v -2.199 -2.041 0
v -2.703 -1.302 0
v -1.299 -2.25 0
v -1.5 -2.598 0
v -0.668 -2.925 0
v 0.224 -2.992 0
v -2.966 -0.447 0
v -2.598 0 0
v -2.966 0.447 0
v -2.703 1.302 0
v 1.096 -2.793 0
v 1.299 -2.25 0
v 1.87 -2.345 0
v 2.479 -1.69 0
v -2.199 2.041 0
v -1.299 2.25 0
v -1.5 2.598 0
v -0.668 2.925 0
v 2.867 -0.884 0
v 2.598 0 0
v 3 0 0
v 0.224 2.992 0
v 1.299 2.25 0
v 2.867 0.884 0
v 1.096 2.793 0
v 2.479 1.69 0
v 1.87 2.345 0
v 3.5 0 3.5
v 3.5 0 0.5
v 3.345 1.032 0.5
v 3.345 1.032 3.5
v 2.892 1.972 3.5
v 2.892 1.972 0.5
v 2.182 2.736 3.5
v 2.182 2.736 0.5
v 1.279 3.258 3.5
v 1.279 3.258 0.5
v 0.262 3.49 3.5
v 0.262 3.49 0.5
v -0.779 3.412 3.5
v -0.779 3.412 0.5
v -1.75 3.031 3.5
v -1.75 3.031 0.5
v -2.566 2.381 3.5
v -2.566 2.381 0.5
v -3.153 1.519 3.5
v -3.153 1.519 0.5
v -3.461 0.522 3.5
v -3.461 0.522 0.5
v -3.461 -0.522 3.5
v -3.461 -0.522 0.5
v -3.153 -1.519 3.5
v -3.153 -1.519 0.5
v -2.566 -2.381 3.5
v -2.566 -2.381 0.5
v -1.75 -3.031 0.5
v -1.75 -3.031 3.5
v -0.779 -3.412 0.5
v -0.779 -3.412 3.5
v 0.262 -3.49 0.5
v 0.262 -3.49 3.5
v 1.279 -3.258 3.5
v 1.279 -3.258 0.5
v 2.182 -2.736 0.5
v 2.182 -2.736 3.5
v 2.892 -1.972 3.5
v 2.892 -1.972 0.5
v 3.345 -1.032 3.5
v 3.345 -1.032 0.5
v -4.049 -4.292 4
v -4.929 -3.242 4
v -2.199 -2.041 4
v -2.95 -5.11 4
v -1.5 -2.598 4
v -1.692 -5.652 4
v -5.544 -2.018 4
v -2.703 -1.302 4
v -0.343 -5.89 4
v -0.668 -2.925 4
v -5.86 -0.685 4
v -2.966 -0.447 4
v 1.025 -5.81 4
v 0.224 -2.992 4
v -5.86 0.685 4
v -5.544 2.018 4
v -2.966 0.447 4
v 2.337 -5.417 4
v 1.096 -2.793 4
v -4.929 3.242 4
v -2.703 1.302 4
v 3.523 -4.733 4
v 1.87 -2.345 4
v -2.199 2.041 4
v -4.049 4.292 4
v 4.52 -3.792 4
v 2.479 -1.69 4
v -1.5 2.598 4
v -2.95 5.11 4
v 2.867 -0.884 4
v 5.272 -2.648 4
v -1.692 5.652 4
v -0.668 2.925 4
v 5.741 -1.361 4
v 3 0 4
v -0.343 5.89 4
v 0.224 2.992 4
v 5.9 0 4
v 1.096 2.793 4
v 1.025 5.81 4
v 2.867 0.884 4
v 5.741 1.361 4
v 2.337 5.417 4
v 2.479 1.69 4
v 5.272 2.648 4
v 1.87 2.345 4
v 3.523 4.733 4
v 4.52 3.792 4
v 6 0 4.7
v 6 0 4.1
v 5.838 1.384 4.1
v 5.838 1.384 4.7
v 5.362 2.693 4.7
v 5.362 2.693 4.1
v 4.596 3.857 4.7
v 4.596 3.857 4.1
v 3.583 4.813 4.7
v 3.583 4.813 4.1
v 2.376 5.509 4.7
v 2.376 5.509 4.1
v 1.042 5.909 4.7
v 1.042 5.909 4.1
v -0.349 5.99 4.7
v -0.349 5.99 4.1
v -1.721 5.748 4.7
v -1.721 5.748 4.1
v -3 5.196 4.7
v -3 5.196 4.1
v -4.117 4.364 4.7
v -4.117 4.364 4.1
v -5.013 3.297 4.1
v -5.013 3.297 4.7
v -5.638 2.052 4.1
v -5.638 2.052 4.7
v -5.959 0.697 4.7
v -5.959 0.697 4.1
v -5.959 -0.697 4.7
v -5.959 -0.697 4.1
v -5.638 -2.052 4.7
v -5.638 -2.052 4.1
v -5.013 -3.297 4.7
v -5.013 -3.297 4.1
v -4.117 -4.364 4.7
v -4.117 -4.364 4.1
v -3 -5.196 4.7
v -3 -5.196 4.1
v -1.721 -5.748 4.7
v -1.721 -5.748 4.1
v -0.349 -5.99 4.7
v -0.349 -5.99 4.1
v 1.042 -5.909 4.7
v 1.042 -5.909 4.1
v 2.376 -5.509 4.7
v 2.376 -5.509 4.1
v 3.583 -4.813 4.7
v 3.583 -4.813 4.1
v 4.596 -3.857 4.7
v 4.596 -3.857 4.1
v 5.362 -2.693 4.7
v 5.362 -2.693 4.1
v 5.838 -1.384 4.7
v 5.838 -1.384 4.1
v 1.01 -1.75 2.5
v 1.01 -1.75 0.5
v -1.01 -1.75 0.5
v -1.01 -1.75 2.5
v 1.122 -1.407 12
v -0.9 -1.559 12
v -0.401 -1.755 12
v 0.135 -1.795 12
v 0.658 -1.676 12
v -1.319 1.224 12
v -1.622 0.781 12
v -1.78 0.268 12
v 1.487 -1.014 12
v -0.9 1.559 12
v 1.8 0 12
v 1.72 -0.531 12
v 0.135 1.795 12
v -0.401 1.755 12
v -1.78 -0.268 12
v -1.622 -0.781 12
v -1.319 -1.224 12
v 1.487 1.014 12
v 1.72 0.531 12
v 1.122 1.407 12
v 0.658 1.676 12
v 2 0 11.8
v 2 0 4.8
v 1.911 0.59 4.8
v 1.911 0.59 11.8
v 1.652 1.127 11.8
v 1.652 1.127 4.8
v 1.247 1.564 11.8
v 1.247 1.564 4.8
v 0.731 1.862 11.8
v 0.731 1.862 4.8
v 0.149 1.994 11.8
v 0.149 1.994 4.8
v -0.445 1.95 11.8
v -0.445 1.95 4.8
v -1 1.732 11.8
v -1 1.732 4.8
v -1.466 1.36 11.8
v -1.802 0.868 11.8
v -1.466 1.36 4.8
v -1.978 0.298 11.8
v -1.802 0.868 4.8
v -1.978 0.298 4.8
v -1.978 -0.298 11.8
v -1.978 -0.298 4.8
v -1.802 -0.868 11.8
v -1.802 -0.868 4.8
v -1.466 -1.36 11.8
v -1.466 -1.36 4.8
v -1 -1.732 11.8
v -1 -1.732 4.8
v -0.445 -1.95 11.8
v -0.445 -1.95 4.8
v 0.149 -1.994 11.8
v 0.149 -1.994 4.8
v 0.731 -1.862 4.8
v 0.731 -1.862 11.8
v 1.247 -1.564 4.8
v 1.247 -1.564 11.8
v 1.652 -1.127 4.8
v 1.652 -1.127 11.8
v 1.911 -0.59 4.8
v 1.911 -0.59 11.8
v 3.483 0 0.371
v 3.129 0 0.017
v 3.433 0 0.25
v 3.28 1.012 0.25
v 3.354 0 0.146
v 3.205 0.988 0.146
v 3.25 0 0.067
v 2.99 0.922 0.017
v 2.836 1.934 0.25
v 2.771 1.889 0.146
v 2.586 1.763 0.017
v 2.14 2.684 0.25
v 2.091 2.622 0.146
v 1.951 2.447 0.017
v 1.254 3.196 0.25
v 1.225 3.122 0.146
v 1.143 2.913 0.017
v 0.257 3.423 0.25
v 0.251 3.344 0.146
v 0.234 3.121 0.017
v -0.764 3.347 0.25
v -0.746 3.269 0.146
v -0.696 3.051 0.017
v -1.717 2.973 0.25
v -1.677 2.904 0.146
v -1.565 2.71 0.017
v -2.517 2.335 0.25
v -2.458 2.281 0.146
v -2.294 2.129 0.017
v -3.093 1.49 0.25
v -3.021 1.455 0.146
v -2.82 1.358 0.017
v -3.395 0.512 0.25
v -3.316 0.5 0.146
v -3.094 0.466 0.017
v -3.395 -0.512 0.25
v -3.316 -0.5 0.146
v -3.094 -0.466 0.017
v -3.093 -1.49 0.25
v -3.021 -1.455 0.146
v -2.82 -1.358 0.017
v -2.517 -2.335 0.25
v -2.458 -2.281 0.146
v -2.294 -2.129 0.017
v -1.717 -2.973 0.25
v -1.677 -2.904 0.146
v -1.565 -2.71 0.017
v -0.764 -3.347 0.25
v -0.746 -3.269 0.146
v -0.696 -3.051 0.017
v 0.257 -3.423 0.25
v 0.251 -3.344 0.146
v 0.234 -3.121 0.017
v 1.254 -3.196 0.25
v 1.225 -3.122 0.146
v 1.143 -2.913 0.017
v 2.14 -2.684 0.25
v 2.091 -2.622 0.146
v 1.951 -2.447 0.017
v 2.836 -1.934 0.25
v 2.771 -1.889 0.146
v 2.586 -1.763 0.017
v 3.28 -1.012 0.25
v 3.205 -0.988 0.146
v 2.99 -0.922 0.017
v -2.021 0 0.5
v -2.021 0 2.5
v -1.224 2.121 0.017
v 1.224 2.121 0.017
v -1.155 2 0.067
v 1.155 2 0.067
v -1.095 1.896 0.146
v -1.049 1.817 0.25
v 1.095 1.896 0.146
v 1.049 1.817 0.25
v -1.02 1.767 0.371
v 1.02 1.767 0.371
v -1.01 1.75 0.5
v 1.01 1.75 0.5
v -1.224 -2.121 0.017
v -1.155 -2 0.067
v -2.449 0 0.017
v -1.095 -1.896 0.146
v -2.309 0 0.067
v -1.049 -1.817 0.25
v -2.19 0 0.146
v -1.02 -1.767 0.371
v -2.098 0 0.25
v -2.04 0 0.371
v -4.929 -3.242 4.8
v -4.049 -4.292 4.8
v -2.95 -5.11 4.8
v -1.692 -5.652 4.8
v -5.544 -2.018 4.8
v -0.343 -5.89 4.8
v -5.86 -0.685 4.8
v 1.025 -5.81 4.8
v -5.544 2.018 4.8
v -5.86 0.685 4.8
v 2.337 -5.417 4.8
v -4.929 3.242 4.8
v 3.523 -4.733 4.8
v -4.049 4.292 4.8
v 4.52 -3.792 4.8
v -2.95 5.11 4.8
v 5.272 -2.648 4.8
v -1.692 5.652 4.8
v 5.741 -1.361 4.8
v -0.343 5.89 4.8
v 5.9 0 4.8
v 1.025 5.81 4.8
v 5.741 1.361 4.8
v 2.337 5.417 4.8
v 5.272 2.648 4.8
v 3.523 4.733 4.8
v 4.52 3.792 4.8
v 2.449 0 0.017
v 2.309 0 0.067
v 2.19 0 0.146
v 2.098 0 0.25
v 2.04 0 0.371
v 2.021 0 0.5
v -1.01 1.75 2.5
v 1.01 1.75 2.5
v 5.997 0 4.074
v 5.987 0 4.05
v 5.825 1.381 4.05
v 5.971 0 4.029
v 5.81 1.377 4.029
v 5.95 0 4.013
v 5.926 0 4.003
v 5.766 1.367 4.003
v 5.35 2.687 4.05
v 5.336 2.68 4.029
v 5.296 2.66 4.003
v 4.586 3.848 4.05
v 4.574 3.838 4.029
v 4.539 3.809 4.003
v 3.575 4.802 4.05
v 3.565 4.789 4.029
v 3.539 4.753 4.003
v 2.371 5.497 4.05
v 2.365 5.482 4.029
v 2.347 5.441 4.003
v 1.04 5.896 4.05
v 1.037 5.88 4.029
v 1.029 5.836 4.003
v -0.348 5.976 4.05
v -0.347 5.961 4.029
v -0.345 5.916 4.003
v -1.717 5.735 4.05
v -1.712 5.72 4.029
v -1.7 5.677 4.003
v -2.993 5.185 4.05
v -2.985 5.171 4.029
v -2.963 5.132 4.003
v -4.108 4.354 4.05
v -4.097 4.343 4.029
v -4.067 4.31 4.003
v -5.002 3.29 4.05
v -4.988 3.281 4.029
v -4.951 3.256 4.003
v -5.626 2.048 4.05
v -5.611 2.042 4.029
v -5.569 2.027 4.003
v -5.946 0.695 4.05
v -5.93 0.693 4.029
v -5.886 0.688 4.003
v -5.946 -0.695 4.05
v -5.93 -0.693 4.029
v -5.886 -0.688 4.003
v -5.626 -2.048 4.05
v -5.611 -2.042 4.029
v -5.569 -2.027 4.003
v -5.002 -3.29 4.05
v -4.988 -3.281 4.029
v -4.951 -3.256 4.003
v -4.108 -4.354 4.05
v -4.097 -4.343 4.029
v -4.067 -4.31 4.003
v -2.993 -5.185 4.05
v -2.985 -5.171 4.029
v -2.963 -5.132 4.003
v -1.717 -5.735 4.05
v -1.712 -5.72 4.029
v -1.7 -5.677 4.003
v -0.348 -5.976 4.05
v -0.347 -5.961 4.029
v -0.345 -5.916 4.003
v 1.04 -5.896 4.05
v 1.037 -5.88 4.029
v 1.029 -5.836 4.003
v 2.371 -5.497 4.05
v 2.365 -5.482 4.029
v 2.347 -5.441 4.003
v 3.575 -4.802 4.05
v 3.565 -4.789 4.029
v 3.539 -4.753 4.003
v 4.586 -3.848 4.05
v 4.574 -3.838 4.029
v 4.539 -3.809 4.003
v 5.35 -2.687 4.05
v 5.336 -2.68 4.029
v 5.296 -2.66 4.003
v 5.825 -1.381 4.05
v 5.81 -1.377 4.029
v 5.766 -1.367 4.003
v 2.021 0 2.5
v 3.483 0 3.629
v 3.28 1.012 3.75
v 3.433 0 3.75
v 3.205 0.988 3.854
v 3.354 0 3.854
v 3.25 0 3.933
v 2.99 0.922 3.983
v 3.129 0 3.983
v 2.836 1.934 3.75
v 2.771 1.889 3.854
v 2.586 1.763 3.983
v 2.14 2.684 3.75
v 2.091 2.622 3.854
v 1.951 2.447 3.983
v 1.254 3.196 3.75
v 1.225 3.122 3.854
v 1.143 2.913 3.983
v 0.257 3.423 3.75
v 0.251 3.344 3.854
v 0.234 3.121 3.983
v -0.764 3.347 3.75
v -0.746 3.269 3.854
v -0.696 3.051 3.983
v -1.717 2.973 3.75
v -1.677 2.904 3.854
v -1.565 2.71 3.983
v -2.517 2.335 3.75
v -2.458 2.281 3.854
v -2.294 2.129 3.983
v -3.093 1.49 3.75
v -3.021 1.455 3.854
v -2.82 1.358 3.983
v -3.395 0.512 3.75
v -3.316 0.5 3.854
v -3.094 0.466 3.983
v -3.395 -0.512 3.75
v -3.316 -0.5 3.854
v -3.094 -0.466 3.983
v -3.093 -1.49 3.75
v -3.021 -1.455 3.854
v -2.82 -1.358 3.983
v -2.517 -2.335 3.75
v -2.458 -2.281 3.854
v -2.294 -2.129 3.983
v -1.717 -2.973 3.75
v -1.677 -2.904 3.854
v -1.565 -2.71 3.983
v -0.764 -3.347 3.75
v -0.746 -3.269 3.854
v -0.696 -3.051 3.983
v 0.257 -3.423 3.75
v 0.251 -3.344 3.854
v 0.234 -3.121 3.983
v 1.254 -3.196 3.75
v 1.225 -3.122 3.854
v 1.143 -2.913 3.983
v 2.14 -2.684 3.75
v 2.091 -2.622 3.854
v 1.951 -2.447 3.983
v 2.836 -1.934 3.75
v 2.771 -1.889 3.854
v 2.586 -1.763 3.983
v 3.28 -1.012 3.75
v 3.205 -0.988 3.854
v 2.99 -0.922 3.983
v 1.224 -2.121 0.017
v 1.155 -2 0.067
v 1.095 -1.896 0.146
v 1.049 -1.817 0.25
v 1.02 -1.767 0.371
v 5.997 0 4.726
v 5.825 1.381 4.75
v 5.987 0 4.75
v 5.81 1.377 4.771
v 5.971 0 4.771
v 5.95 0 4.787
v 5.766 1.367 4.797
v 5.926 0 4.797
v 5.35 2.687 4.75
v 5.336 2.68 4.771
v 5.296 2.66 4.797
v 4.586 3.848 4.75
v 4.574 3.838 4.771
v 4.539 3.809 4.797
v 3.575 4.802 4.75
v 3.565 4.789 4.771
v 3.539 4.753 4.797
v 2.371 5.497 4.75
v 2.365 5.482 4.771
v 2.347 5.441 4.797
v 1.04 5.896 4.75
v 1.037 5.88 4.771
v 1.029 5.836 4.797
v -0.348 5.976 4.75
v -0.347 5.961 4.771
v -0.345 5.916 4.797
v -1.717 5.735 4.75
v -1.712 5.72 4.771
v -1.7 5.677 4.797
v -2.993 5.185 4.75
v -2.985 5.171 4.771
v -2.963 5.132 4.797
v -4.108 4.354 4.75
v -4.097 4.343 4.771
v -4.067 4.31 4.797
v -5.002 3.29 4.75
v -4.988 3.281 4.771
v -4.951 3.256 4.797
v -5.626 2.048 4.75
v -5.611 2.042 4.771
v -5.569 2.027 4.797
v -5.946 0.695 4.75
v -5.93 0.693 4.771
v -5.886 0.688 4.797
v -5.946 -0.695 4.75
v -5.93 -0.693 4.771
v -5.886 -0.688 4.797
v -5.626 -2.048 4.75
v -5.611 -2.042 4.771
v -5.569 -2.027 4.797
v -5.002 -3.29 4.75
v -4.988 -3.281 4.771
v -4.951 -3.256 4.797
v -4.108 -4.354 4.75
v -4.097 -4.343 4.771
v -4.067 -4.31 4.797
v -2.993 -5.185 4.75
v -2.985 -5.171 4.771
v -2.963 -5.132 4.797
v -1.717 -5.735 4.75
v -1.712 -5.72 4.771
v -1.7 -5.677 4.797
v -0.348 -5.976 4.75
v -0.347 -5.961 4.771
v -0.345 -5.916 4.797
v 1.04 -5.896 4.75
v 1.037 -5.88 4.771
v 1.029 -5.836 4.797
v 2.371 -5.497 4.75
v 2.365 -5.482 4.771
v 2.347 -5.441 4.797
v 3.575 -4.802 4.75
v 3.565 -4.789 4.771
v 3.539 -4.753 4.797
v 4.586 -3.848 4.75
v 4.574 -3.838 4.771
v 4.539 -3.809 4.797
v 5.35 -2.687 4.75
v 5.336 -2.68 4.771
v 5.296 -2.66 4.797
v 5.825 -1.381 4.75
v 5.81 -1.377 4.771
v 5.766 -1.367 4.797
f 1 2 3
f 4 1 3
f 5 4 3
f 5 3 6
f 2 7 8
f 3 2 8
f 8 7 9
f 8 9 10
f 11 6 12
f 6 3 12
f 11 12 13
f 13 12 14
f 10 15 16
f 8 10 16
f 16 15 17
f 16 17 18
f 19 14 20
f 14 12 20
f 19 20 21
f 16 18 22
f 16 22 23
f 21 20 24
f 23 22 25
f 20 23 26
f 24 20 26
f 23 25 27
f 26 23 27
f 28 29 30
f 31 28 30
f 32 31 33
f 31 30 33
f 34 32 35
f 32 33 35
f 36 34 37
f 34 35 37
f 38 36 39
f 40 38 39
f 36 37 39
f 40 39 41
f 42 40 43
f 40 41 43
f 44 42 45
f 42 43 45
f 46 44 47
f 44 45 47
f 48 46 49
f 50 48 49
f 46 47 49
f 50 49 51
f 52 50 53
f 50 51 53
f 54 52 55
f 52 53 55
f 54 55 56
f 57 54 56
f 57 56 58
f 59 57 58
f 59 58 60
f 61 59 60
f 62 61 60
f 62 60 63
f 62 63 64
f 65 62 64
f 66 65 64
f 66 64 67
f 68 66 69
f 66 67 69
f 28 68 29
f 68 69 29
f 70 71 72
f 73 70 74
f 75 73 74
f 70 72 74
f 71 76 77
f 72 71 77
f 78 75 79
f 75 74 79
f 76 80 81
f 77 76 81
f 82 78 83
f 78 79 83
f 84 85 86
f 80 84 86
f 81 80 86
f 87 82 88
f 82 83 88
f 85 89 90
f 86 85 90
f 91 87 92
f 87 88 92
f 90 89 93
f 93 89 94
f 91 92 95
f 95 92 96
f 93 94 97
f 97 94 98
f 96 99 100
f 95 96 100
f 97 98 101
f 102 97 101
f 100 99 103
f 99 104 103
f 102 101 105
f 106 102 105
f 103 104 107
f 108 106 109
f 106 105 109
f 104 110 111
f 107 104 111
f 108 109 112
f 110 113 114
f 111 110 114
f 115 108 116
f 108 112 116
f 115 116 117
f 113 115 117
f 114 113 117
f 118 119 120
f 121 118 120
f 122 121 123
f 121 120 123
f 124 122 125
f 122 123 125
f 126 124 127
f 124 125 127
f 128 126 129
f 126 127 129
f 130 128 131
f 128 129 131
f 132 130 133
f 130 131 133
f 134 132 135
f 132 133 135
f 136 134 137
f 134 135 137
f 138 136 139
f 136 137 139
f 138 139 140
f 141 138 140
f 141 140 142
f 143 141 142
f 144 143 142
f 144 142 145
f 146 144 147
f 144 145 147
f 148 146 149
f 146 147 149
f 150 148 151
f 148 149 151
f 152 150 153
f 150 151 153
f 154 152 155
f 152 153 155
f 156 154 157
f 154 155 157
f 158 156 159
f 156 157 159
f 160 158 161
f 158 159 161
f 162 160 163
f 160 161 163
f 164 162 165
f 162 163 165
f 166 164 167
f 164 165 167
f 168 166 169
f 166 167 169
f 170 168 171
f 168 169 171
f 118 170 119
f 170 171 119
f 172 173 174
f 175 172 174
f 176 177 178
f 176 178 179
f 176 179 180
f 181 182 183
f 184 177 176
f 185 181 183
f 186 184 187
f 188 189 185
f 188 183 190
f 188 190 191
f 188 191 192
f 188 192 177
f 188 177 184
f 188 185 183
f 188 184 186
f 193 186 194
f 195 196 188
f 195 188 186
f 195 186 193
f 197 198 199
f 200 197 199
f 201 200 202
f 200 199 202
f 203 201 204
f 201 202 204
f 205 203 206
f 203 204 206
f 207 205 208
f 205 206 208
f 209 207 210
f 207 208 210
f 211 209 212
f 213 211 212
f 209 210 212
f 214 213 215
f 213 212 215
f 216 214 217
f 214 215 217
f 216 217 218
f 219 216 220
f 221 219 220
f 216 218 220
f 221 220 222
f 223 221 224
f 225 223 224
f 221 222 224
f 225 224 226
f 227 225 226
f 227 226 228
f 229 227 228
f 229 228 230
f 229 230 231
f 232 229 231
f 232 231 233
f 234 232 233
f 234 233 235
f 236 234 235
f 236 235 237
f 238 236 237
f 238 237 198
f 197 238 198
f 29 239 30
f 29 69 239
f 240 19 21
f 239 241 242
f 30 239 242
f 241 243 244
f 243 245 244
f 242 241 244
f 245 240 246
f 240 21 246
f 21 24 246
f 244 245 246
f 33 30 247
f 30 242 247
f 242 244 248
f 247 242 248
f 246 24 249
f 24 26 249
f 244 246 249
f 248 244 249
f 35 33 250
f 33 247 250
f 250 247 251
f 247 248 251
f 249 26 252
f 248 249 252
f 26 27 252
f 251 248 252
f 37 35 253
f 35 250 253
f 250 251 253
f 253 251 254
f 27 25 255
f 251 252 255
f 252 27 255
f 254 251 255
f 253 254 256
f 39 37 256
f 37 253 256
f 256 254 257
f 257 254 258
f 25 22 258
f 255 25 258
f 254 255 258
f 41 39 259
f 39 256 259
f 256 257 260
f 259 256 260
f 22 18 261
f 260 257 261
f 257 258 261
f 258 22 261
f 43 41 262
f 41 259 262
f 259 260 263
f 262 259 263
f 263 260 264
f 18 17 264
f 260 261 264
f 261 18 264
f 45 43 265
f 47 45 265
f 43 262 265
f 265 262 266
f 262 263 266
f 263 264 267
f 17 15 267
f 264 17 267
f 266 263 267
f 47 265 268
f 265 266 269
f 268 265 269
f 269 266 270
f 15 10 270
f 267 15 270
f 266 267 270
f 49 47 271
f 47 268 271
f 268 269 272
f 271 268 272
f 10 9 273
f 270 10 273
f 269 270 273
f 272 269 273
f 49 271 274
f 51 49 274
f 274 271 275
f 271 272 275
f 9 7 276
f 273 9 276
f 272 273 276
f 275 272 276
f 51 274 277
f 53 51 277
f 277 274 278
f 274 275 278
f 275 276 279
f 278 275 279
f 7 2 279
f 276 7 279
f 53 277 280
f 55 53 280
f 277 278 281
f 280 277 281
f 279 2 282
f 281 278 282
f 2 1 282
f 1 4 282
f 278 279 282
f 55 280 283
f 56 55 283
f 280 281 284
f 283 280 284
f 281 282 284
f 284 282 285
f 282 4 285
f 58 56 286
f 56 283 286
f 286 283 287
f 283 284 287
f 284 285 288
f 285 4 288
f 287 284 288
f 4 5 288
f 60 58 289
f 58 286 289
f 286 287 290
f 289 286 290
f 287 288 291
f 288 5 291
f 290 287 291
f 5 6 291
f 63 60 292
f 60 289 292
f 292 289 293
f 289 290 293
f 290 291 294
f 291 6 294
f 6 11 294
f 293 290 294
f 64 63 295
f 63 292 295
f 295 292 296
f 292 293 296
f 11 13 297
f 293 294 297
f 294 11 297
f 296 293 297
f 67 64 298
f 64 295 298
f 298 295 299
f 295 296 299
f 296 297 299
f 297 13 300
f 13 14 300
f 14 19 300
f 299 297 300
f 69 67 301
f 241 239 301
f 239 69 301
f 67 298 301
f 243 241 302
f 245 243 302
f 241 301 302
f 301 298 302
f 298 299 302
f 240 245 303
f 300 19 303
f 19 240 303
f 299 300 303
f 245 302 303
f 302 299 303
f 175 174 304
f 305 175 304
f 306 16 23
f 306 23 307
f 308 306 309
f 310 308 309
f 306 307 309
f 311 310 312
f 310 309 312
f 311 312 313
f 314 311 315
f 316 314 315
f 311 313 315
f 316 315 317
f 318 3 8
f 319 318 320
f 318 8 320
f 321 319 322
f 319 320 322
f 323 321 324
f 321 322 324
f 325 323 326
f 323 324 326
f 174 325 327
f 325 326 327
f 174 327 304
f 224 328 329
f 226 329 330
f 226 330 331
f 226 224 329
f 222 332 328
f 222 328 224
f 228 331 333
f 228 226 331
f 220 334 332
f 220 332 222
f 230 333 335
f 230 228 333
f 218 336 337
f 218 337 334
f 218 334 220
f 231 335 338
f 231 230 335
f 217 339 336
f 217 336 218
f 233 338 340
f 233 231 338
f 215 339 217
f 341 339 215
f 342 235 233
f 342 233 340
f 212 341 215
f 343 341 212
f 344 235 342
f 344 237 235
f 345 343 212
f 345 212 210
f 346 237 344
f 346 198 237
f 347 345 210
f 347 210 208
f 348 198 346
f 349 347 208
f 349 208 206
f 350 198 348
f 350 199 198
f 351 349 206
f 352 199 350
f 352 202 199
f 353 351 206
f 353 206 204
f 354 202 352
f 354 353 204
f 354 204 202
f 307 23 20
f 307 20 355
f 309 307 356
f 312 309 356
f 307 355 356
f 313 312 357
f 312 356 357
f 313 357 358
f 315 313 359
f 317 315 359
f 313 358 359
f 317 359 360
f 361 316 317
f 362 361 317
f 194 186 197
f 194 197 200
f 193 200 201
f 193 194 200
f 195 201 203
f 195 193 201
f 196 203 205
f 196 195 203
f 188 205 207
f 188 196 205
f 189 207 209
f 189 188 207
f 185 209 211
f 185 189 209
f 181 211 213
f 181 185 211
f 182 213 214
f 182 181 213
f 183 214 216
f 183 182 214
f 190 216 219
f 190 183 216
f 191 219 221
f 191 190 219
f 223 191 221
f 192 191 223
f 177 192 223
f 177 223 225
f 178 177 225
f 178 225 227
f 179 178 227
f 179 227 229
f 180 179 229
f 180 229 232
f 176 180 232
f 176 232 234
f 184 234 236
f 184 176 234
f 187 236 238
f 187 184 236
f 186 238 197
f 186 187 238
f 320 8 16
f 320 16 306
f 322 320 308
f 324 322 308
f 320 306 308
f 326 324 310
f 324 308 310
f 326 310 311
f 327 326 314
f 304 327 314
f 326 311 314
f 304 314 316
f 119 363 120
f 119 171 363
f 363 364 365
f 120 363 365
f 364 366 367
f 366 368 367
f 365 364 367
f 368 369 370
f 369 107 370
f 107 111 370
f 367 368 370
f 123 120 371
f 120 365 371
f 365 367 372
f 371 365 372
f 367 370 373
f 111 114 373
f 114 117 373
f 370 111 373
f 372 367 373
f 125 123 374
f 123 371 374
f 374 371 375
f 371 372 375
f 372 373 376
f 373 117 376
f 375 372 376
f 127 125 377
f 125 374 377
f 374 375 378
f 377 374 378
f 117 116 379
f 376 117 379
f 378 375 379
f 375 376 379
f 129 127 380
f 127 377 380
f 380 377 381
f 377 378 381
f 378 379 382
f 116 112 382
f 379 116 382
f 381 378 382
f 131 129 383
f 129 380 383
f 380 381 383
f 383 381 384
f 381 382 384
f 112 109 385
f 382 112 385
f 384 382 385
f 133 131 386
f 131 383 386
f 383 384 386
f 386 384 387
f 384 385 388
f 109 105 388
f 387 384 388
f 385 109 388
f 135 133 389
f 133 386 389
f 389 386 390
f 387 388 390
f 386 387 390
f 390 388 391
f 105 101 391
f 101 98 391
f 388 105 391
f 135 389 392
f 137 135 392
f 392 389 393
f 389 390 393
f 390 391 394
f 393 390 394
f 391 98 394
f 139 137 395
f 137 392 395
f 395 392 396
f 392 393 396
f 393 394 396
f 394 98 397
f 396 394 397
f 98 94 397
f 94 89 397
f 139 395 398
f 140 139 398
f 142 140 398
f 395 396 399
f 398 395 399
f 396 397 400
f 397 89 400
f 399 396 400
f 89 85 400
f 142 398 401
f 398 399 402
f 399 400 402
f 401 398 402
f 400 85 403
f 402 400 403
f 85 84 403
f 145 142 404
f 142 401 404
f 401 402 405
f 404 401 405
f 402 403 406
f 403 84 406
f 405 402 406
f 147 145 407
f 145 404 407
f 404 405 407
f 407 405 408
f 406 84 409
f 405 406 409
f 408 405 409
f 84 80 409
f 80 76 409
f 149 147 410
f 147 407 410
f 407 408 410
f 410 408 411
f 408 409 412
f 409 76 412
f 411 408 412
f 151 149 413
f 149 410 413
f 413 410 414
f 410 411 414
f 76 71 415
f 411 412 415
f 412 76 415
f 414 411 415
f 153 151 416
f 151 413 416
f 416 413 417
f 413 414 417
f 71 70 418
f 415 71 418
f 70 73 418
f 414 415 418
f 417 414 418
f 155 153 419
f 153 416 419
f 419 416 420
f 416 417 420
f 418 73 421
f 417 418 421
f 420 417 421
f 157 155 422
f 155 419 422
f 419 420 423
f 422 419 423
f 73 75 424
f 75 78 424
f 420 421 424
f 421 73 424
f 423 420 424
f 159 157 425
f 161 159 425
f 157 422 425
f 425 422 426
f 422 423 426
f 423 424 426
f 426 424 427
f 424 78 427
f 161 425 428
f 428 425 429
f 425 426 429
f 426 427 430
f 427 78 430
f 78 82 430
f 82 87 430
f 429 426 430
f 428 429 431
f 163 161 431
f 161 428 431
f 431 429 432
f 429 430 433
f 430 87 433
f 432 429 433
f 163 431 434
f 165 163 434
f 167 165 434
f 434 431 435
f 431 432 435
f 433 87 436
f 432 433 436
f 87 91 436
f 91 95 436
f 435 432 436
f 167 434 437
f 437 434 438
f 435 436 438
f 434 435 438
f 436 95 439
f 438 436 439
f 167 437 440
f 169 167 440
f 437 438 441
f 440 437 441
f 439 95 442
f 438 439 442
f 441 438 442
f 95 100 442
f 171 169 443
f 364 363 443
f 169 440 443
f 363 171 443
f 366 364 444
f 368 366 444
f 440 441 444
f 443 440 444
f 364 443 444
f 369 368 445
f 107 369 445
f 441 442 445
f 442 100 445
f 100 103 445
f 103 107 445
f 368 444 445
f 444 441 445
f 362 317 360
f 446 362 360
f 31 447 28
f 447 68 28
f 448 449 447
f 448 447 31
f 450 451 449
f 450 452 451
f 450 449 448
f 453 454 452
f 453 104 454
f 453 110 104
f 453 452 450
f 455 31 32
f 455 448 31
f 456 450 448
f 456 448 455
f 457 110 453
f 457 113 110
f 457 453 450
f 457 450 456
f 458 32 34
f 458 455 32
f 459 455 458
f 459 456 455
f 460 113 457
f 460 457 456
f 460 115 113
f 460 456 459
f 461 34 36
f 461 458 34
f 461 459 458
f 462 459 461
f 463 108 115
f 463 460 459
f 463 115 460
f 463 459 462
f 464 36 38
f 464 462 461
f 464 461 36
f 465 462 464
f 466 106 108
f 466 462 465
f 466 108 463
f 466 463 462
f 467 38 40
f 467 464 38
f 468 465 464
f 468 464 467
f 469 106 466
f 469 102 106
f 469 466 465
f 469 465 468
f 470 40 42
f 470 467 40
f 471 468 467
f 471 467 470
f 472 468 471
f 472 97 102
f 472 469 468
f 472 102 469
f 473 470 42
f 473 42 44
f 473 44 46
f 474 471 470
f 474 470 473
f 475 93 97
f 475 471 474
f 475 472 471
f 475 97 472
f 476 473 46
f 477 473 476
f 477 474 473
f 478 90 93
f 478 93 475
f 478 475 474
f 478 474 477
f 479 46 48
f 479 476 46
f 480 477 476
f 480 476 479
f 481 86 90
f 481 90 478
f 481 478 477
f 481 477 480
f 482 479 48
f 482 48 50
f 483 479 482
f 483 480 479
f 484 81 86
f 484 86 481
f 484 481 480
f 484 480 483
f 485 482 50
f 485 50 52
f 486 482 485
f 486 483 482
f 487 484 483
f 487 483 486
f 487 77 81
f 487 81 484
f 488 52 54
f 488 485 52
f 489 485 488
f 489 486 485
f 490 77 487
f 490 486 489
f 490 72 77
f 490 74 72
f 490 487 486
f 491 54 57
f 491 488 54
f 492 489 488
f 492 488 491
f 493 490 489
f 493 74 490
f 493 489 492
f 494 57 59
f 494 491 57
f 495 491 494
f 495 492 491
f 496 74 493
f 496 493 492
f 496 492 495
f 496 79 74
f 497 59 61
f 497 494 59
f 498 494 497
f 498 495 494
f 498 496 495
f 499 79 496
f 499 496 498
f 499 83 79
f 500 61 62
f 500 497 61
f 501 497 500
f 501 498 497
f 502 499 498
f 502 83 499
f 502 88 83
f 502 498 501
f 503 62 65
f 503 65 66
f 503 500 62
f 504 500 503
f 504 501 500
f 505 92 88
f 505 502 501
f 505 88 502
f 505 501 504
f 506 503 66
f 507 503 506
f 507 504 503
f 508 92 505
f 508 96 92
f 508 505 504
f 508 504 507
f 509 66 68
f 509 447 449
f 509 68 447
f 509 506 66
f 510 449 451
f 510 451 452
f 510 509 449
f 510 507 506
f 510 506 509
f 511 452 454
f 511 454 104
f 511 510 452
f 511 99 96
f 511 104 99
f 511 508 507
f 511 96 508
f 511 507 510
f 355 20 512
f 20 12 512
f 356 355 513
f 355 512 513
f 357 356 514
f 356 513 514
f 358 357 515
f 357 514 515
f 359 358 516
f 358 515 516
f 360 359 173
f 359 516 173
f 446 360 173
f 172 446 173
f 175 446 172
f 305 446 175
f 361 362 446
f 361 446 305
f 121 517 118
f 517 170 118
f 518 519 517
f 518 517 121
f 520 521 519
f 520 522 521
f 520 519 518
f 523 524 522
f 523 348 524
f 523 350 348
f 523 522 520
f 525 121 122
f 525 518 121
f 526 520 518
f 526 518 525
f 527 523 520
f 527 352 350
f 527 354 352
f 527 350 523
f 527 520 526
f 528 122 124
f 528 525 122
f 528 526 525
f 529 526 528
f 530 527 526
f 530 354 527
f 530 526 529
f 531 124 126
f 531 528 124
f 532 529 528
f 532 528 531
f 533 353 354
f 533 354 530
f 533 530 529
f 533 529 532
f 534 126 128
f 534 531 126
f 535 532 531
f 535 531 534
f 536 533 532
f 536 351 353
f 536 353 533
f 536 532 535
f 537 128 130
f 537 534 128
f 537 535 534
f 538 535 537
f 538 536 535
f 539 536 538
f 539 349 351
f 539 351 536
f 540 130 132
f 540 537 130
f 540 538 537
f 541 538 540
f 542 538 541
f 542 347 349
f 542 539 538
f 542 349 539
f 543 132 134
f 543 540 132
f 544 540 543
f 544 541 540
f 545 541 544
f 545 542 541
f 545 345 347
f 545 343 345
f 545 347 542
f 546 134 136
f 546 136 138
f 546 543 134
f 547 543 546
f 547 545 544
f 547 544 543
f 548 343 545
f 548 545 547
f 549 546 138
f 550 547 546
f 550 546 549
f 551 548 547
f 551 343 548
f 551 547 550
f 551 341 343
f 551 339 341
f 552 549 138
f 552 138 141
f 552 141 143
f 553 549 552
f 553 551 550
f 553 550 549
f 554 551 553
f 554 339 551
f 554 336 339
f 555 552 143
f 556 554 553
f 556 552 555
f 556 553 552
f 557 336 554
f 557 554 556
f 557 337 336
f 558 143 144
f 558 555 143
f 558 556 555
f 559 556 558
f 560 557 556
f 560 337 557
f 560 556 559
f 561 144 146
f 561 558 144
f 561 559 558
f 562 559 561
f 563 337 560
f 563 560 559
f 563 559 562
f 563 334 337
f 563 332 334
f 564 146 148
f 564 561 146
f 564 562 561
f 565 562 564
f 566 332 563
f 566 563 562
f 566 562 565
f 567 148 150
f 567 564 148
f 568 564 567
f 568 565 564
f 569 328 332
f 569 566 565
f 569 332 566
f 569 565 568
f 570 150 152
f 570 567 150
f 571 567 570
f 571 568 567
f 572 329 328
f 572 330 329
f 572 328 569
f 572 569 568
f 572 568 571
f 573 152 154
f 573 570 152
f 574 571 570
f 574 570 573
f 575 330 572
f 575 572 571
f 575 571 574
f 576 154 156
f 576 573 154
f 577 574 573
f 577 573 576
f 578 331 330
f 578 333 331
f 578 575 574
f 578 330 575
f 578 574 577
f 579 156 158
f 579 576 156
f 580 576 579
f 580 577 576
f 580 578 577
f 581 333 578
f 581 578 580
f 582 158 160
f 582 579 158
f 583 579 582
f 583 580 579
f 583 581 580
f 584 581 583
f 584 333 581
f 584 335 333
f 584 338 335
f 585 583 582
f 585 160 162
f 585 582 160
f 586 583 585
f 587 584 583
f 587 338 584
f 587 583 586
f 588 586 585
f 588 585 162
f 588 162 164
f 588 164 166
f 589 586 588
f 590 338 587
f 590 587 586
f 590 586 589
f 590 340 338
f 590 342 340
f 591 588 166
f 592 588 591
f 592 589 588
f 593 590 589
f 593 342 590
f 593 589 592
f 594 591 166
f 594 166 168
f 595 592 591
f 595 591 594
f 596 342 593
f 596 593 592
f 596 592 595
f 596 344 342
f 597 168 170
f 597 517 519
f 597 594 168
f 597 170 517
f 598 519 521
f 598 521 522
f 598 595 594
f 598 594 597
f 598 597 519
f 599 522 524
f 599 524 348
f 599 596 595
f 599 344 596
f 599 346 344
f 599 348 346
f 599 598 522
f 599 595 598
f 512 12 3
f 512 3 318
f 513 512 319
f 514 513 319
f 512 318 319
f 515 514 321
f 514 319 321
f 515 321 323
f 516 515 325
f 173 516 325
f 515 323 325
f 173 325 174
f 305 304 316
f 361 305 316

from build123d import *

# Parameters (mm, degrees)
SKETCH1_R           = 3.5
BOSS_EXTRUDE1_DEPTH = 4
SKETCH2_R           = 2
BOSS_EXTRUDE2_DEPTH = 8
CUT_EXTRUDE1_DEPTH  = 2.5
FILLET1_R           = 0.5
CHAMFER1_SIZE       = 0.2
SKETCH4_R           = 6
BOSS_EXTRUDE3_DEPTH = 0.8
FILLET2_R           = 0.1


with BuildPart() as part:
    # Sketch1 → Boss-Extrude1 (new body)
    with BuildSketch(Plane.XY):
        Circle(SKETCH1_R)
    extrude(amount=BOSS_EXTRUDE1_DEPTH)

    # Sketch2 → Boss-Extrude2 (add)
    with BuildSketch(Plane.XY.offset(4)):
        Circle(SKETCH2_R)
    extrude(amount=BOSS_EXTRUDE2_DEPTH)

    # Sketch3 → Cut-Extrude1 (cut)
    with BuildSketch(Plane(origin=(0, 0, 0), x_dir=(-1, 0, 0), z_dir=(0, 0, -1))):
        Polygon((2.020725942, 0), (1.010362971, 1.75), (-1.010362971, 1.75), (-2.020725942, 0), (-1.010362971, -1.75), (1.010362971, -1.75), align=None)
    extrude(amount=-CUT_EXTRUDE1_DEPTH, mode=Mode.SUBTRACT)

    # Fillet1
    fillet1_edges = [part.edges().sort_by_distance(p)[0] for p in [
        (-1.515544457, -0.875, 0),
        (-1.515544457, 0.875, 0),
        (0, 1.75, 0),
        (1.515544457, 0.875, 0),
        (1.515544457, -0.875, 0),
        (0, -1.75, 0),
        (-3.5, 0, 0),
        (-3.5, 0, 4),
        (-2, 0, 4),
    ]]
    fillet(fillet1_edges, radius=FILLET1_R)

    # Chamfer1
    chamfer1_edges = [part.edges().sort_by_distance(p)[0] for p in [
        (-2, 0, 12),
    ]]
    chamfer(chamfer1_edges, length=CHAMFER1_SIZE)

    # Sketch4 → Boss-Extrude3 (add)
    with BuildSketch(Plane.XY.offset(4)):
        Circle(SKETCH4_R)
    extrude(amount=BOSS_EXTRUDE3_DEPTH)

    # Fillet2
    fillet2_edges = [part.edges().sort_by_distance(p)[0] for p in [
        (-6, 0, 4),
        (-6, 0, 4.8),
    ]]
    fillet(fillet2_edges, radius=FILLET2_R)


solid = part.part
